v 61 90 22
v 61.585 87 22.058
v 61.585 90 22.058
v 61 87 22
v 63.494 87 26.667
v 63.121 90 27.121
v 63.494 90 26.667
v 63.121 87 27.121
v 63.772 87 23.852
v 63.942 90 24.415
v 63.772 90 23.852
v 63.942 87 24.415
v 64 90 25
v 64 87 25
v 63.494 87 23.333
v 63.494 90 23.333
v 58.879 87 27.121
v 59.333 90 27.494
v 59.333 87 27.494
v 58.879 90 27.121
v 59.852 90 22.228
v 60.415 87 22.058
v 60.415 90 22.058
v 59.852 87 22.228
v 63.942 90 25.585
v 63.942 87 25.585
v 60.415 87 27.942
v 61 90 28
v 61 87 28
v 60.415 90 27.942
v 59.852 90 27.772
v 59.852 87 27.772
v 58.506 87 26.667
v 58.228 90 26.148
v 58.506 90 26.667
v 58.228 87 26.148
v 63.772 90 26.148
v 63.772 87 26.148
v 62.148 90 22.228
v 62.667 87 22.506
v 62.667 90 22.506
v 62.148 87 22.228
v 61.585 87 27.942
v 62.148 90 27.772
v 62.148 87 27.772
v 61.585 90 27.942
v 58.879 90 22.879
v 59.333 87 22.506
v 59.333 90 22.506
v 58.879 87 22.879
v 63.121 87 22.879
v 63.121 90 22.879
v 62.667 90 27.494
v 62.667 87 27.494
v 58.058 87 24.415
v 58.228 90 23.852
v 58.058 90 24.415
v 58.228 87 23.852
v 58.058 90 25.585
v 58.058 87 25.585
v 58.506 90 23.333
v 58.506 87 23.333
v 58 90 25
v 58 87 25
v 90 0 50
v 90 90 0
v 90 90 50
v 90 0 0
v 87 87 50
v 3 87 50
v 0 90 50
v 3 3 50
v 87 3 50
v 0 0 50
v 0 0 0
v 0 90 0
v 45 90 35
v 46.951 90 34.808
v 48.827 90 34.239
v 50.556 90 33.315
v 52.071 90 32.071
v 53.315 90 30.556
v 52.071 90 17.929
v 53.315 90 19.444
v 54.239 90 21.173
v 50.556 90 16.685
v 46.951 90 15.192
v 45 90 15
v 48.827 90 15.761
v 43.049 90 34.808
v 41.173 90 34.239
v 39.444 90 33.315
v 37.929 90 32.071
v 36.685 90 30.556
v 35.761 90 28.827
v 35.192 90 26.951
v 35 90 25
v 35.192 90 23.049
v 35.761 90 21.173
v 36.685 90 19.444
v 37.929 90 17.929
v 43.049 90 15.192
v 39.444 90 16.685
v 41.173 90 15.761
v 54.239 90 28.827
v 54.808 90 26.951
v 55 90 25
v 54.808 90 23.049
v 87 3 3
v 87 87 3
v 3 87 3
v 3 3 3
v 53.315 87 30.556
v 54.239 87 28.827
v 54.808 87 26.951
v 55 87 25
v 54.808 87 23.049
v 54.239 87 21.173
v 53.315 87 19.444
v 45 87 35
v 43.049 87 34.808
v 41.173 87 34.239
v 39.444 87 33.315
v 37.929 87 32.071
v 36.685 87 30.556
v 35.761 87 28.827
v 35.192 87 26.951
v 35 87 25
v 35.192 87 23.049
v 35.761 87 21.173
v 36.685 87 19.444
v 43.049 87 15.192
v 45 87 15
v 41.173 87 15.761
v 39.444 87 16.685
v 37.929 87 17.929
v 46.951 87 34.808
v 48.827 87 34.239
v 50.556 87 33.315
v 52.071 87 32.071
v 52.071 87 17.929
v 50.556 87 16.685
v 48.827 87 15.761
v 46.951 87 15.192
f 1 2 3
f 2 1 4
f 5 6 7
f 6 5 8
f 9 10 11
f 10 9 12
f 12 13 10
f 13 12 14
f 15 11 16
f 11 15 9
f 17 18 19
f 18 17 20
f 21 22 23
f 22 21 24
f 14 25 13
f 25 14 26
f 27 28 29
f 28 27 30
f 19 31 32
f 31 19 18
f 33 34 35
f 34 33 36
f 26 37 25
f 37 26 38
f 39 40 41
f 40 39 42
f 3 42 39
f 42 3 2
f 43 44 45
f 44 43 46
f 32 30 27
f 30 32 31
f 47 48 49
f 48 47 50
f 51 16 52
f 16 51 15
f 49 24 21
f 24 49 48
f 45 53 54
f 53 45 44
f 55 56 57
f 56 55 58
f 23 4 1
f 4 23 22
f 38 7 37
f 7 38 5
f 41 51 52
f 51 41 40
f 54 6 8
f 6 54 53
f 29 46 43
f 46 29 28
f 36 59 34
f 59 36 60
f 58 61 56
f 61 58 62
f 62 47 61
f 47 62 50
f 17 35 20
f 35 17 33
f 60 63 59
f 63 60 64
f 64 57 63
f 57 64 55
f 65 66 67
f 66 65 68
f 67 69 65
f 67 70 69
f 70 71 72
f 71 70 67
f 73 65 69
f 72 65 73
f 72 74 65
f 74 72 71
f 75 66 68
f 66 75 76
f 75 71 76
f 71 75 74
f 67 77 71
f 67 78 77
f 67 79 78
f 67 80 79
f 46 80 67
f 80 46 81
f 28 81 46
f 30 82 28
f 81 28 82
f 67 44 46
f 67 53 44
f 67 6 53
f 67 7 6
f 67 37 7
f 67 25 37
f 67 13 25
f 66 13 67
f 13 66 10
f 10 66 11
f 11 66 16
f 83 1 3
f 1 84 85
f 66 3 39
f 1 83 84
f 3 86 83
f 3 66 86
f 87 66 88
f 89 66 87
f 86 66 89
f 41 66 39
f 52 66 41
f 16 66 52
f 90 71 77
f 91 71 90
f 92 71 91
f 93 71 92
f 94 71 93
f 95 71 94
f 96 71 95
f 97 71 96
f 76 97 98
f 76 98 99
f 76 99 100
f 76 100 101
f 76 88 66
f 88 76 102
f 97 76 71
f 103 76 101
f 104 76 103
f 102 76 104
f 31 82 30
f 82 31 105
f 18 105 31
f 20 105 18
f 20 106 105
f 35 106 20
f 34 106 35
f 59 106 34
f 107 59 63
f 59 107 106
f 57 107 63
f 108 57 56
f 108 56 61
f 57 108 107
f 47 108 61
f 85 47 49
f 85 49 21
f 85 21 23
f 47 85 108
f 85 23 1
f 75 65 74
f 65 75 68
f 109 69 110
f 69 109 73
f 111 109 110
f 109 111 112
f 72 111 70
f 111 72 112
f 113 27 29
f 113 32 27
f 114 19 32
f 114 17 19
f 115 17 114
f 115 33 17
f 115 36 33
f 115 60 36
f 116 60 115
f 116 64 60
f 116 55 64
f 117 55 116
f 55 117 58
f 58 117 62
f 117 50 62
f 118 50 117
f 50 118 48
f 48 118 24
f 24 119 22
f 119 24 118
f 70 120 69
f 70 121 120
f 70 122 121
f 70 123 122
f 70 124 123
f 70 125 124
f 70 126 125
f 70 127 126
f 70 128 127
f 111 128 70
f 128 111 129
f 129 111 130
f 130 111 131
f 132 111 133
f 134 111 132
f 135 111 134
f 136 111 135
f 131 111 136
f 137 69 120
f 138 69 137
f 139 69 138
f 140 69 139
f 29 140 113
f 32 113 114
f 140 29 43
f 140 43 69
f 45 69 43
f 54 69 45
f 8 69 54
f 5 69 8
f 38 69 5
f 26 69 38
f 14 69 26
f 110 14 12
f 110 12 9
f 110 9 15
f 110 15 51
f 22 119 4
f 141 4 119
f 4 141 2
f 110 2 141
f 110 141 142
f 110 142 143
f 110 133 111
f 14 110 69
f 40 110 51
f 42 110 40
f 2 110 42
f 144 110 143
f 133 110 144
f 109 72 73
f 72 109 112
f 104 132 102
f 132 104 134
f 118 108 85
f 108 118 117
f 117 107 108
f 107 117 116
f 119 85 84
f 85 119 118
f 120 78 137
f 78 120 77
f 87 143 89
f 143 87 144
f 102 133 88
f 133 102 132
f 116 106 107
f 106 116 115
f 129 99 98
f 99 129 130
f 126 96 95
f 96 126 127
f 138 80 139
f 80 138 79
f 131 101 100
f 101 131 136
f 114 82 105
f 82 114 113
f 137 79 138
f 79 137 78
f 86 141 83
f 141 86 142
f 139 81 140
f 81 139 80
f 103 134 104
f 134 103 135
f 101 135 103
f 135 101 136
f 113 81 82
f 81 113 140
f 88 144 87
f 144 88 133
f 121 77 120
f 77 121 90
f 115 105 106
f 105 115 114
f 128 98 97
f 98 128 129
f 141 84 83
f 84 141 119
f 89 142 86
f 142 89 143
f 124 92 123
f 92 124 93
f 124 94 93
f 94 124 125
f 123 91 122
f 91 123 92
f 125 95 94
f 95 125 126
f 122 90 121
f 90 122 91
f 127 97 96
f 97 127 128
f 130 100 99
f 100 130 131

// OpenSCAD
$fn = 32;

// ----------------------------------------------------------------------
// Vent box: roundvent enclosure
// ----------------------------------------------------------------------

// --- parameters (mm) ---
box_l = 90;               // box length, X
box_w = 90;               // box width, Y
box_h = 50;               // box height, Z
wall_t = 3;               // shell wall thickness
vent_d = 20;              // central vent diameter
ring_d = 6;               // ring hole diameter
n_ring = 6;               // holes in the ring
ring_r = 16;              // ring radius

ring_step = 360 / n_ring;  // ring hole angular step

difference() {
  cube([box_l, box_w, box_h]);
  translate([wall_t, wall_t, wall_t])
    cube([box_l - 2 * wall_t, box_w - 2 * wall_t, box_h]);
  translate([box_l / 2, box_w - wall_t - 1, box_h / 2])
    rotate([-90, 0, 0]) cylinder(h = wall_t + 2, d = vent_d);
  for (i = [0 : n_ring - 1])
    translate([box_l / 2, box_w - wall_t - 1, box_h / 2])
      rotate([0, 0, i * ring_step])
        translate([ring_r, 0, 0]) rotate([-90, 0, 0])
          cylinder(h = wall_t + 2, d = ring_d);
}
